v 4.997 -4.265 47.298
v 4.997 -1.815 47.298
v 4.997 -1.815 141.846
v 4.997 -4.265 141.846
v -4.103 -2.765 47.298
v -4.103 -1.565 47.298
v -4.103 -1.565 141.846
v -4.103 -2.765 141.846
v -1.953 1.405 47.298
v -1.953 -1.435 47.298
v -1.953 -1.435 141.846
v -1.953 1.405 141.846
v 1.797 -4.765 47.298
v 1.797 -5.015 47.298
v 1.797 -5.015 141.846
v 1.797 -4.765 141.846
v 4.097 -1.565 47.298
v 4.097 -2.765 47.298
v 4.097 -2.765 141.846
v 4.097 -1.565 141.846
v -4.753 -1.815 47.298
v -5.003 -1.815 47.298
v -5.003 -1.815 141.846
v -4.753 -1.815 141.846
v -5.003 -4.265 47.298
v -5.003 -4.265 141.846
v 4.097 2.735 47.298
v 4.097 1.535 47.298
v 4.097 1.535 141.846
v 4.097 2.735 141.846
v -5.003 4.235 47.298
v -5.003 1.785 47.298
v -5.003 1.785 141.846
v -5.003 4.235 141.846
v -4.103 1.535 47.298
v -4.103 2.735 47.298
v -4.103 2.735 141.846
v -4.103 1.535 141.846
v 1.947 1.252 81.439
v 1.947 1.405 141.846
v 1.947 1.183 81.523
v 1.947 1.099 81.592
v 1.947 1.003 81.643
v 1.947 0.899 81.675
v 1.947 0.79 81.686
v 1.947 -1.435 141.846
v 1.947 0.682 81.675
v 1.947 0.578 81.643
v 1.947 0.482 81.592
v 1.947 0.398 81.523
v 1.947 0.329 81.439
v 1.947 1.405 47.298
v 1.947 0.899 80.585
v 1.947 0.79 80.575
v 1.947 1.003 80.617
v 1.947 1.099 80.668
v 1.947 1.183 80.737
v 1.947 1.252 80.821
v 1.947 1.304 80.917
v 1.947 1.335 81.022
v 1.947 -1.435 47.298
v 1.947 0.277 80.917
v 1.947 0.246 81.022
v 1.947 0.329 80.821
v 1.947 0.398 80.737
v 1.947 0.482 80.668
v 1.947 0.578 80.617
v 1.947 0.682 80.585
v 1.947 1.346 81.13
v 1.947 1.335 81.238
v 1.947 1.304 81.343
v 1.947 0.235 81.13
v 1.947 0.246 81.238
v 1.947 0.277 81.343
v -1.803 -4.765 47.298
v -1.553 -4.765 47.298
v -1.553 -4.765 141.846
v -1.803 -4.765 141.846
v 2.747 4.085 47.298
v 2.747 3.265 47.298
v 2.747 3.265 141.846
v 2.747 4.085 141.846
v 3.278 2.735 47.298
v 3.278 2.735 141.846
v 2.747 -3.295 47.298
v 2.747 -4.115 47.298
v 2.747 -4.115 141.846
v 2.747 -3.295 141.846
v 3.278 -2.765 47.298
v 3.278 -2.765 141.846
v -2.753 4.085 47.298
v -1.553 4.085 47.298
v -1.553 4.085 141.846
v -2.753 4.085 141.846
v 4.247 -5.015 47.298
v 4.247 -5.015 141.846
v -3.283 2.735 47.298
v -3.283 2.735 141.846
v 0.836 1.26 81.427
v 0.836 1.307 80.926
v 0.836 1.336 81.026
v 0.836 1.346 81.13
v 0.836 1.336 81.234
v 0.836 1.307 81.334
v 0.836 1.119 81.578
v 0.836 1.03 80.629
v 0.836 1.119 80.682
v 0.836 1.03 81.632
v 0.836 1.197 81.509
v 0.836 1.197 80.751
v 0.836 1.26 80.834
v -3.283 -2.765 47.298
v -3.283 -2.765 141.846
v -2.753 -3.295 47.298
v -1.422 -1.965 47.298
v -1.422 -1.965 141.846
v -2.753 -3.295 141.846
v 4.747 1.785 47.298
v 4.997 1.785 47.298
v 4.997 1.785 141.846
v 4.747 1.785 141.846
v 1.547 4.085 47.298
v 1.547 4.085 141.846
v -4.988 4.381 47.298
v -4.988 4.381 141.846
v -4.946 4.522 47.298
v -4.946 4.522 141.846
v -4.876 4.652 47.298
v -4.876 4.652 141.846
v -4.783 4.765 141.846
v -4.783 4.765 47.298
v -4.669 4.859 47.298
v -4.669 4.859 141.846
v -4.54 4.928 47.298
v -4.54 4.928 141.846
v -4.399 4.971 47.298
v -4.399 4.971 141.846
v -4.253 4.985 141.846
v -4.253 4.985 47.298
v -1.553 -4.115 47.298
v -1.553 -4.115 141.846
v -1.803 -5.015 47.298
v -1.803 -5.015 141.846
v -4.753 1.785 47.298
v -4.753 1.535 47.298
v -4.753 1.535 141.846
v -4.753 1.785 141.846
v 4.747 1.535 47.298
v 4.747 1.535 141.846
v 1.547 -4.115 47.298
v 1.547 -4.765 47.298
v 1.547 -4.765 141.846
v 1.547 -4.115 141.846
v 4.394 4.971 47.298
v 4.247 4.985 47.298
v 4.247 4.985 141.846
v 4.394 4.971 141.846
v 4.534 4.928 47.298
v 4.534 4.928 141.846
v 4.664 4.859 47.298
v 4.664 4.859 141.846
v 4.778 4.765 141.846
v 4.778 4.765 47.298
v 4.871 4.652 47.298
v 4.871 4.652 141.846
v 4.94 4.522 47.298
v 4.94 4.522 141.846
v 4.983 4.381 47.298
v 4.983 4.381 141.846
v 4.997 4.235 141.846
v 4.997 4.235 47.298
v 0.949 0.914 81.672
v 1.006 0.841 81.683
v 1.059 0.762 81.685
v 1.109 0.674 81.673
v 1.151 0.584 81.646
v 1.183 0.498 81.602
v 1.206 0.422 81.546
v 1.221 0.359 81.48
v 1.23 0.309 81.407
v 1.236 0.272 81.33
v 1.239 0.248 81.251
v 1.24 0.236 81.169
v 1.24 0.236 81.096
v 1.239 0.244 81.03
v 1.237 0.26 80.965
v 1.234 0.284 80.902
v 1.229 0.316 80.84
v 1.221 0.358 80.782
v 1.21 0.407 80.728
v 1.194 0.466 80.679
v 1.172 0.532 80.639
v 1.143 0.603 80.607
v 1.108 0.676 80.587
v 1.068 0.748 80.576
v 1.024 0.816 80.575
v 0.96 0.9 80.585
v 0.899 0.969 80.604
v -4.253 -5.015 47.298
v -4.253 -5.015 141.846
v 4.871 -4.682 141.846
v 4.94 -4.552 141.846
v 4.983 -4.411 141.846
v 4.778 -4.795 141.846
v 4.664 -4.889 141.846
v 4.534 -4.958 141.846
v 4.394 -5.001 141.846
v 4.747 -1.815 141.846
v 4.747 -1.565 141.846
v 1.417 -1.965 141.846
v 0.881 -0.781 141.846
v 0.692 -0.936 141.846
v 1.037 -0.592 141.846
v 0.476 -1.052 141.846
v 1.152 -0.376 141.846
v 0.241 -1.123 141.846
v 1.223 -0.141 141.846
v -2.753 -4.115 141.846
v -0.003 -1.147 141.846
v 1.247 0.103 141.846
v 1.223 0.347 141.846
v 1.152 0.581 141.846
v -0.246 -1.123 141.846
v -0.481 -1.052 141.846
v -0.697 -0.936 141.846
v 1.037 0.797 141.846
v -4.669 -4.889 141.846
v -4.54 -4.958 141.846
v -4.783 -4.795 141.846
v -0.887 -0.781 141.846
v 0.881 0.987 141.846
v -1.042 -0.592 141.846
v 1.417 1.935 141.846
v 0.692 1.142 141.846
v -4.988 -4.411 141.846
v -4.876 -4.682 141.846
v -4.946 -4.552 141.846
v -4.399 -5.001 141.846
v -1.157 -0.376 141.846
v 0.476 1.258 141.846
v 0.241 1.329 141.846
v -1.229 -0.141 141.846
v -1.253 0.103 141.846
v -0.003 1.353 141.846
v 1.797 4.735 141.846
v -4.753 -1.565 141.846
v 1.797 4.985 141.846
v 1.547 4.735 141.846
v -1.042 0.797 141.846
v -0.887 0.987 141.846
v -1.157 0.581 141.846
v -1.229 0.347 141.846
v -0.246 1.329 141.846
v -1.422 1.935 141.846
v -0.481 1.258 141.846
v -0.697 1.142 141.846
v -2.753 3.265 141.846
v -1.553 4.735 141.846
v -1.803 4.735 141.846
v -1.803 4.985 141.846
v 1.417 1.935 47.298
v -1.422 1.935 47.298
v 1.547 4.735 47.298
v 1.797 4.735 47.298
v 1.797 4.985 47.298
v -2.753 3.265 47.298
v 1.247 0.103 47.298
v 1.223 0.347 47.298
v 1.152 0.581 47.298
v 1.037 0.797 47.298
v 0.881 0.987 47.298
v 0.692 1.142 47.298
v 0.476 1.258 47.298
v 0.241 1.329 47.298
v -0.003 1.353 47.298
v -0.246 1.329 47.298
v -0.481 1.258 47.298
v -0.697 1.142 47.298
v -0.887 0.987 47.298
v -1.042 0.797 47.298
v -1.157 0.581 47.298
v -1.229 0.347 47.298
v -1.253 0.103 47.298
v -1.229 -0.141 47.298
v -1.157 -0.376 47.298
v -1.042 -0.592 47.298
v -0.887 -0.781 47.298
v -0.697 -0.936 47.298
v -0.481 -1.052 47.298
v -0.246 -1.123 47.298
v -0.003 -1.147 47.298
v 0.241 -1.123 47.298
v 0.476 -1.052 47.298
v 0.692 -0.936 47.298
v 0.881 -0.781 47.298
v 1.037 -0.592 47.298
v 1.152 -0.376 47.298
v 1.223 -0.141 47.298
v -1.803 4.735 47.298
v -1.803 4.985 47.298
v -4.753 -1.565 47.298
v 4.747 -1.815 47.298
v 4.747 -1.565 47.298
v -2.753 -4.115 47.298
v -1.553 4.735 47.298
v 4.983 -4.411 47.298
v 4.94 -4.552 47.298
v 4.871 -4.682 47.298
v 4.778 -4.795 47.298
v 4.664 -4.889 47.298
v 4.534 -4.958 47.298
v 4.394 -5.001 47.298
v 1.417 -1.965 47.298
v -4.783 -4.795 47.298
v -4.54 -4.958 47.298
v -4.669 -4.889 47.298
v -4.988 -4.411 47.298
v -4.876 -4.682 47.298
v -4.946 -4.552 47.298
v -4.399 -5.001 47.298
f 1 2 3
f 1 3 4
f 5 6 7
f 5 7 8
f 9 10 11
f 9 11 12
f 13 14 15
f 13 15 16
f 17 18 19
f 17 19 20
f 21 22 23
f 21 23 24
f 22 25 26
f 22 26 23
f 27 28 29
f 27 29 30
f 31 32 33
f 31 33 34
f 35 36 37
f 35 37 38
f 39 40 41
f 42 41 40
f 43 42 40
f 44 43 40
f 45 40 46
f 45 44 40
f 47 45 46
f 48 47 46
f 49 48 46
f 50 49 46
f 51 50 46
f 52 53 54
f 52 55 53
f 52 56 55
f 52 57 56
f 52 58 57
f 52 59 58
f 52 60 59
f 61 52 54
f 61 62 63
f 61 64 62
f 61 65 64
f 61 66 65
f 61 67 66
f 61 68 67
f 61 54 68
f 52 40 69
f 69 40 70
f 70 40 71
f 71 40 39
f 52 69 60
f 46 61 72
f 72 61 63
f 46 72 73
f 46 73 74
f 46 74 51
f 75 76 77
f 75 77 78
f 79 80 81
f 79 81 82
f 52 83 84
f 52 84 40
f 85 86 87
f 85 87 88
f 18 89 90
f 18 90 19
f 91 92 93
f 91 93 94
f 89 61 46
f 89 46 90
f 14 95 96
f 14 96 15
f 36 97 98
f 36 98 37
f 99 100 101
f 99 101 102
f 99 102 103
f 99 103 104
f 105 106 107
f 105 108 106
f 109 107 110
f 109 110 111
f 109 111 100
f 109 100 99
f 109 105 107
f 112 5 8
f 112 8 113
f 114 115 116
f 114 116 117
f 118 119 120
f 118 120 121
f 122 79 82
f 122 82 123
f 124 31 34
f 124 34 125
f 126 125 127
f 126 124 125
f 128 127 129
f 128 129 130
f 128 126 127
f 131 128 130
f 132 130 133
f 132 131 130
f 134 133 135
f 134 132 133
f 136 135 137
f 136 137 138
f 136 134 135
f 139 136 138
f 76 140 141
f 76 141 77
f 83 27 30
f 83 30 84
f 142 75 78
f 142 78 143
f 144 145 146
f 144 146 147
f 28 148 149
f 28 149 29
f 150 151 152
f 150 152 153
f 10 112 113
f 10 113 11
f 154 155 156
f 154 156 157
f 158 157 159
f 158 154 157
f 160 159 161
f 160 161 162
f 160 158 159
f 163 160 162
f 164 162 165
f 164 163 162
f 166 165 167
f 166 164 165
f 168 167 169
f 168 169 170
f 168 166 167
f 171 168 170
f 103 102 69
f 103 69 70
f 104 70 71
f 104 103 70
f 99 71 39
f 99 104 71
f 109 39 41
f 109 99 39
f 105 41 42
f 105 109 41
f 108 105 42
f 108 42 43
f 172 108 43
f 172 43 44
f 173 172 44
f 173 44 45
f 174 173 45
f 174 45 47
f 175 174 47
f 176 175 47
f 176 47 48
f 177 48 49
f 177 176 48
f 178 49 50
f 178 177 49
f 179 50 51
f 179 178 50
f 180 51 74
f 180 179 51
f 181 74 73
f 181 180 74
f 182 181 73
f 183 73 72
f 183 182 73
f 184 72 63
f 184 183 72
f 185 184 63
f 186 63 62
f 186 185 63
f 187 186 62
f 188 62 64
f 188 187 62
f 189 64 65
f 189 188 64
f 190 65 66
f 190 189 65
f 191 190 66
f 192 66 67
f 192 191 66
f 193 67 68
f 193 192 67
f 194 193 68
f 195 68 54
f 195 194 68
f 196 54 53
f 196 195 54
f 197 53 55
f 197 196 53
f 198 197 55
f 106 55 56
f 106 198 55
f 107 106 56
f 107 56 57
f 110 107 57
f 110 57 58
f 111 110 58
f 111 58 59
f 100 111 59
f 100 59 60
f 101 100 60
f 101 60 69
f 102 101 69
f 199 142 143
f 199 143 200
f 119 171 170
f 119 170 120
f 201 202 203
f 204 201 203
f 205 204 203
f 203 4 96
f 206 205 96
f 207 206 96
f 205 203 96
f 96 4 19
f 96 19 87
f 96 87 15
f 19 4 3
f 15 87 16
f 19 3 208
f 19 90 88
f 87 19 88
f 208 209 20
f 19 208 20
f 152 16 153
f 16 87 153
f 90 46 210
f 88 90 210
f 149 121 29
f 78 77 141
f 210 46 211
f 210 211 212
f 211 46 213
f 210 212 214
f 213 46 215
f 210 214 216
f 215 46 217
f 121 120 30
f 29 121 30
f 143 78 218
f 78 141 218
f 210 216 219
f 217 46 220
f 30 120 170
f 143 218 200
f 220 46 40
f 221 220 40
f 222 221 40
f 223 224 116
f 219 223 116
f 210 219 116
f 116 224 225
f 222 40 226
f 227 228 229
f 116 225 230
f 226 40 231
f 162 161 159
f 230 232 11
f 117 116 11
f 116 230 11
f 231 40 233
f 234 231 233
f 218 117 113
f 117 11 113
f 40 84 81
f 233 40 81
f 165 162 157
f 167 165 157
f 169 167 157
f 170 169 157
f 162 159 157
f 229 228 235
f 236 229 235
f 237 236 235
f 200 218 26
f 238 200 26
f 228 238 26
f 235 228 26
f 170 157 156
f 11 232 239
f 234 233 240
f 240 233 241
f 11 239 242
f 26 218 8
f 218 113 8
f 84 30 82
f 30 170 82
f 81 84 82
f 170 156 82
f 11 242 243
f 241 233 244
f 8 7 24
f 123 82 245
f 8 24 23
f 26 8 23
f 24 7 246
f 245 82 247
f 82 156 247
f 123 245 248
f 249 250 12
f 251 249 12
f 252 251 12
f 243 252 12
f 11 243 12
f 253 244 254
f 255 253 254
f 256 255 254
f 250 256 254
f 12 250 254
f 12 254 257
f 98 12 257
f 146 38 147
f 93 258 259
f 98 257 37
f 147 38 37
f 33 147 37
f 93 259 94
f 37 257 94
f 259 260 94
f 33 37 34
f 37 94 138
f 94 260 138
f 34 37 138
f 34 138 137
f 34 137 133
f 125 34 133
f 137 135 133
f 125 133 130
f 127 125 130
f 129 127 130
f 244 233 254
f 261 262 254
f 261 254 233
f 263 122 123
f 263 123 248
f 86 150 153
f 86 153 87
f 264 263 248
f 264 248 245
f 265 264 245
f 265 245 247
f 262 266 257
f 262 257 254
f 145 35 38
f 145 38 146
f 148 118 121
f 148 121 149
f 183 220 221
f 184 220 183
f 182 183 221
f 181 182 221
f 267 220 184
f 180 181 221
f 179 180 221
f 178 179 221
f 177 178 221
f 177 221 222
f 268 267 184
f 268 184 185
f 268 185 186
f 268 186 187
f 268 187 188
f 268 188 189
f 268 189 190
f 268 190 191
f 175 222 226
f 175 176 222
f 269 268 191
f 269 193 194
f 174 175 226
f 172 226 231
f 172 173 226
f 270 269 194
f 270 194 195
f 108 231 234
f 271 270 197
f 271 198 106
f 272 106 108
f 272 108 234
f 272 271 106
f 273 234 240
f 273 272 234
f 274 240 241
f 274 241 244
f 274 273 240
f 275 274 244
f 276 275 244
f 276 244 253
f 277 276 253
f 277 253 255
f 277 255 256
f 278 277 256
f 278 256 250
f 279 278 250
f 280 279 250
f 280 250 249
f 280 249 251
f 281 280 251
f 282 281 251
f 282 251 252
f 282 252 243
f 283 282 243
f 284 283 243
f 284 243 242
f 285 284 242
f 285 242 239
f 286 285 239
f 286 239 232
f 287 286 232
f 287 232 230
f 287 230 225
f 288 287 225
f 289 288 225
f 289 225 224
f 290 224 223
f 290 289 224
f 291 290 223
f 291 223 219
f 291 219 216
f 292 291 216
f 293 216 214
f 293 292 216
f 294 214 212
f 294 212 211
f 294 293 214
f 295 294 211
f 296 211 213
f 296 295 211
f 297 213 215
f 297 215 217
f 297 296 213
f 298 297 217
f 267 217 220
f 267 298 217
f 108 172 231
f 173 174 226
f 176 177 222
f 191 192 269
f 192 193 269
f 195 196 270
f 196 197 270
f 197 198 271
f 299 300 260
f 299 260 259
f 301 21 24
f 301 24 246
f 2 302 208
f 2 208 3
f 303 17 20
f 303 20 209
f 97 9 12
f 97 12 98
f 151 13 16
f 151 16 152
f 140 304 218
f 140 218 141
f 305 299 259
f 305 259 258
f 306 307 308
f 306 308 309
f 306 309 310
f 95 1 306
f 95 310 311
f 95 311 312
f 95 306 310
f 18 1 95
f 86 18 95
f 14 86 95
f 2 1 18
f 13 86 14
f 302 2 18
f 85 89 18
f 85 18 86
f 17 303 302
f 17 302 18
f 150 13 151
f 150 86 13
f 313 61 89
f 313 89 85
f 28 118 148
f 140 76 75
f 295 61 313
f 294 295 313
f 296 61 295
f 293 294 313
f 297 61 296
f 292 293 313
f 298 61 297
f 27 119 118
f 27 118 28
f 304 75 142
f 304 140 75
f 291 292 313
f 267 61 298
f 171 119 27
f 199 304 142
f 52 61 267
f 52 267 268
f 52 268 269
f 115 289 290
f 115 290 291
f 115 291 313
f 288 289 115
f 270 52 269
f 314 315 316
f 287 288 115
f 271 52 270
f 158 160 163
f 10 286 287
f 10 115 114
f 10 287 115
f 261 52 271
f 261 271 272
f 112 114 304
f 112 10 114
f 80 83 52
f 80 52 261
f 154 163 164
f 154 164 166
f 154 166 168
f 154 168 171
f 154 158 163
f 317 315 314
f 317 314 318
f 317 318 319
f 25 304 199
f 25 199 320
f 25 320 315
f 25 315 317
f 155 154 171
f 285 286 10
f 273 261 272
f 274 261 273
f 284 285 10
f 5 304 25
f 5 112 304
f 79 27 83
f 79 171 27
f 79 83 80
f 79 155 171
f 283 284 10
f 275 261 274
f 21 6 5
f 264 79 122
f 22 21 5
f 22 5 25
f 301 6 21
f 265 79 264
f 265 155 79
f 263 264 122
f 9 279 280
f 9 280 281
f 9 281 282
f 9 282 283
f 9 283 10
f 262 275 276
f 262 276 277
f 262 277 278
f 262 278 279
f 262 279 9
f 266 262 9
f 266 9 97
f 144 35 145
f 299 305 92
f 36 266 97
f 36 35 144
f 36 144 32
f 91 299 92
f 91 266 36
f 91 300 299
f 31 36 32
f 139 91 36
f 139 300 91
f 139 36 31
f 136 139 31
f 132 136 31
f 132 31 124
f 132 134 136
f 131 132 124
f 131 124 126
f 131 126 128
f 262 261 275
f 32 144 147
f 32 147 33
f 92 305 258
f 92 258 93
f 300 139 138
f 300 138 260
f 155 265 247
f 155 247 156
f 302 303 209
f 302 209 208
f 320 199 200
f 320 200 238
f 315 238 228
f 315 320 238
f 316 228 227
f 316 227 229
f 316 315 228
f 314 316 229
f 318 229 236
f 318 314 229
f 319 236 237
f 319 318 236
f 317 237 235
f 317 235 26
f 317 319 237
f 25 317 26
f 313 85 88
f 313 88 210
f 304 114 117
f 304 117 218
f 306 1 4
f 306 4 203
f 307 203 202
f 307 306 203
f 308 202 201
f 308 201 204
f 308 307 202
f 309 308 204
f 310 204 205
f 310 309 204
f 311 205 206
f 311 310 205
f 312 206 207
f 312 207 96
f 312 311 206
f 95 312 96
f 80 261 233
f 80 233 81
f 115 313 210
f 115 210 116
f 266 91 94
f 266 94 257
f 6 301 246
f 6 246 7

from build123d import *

# Parameters (mm, degrees)
SKETCH1_R           = 2.5
BOSS_EXTRUDE1_DEPTH = 189.096108091
SCALE_2_SCALE       = 3
SCALE_3_SCALE       = 6
SCALE_5_SCALE       = 2
SCALE_6_SCALE       = 0.25
SCALE_7_SCALE       = 0.125
SCALE_8_SCALE       = 0.25
SCALE_9_SCALE       = 4
SCALE_10_SCALE      = 4
OTHER_START         = 7.55
OTHER_1_OUTLINE_R   = 5
OTHER_1_DEPTH       = 10
SCALE_11_SCALE      = 0.111111111


# Read off the part's stored shape, not the designer's step: 孔1
with BuildPart() as part:
    # Sketch1 → Boss-Extrude1 (new body)
    with BuildSketch(Plane.XY):
        with BuildLine():
            Line((2.839339828, 3.9), (5.5, 6.560660172))
            Line((5.5, 6.560660172), (5.5, 8.2))
            Line((5.5, 8.2), (3.1, 8.2))
            Line((3.1, 8.2), (3.1, 9.5))
            Line((3.1, 9.5), (3.6, 9.5))
            Line((3.6, 9.5), (3.6, 10))
            Line((3.6, 10), (8.5, 10))
            ThreePointArc((8.5, 10), (9.560660172, 9.560660172), (10, 8.5))
            Line((10, 8.5), (10, 3.6))
            Line((10, 3.6), (9.5, 3.6))
            Line((9.5, 3.6), (9.5, 3.1))
            Line((9.5, 3.1), (8.2, 3.1))
            Line((8.2, 3.1), (8.2, 5.5))
            Line((8.2, 5.5), (6.560660172, 5.5))
            Line((6.560660172, 5.5), (3.9, 2.839339828))
            Line((3.9, 2.839339828), (3.9, -2.839339828))
            Line((3.9, -2.839339828), (6.560660172, -5.5))
            Line((6.560660172, -5.5), (8.2, -5.5))
            Line((8.2, -5.5), (8.2, -3.1))
            Line((8.2, -3.1), (9.5, -3.1))
            Line((9.5, -3.1), (9.5, -3.6))
            Line((9.5, -3.6), (10, -3.6))
            Line((10, -3.6), (10, -8.5))
            ThreePointArc((10, -8.5), (9.560660172, -9.560660172), (8.5, -10))
            Line((8.5, -10), (3.6, -10))
            Line((3.6, -10), (3.6, -9.5))
            Line((3.6, -9.5), (3.1, -9.5))
            Line((3.1, -9.5), (3.1, -8.2))
            Line((3.1, -8.2), (5.5, -8.2))
            Line((5.5, -8.2), (5.5, -6.560660172))
            Line((5.5, -6.560660172), (2.839339828, -3.9))
            Line((2.839339828, -3.9), (-2.839339828, -3.9))
            Line((-2.839339828, -3.9), (-5.5, -6.560660172))
            Line((-5.5, -6.560660172), (-5.5, -8.2))
            Line((-5.5, -8.2), (-3.1, -8.2))
            Line((-3.1, -8.2), (-3.1, -9.5))
            Line((-3.1, -9.5), (-3.6, -9.5))
            Line((-3.6, -9.5), (-3.6, -10))
            Line((-3.6, -10), (-8.5, -10))
            ThreePointArc((-8.5, -10), (-9.560660172, -9.560660172), (-10, -8.5))
            Line((-10, -8.5), (-10, -3.6))
            Line((-10, -3.6), (-9.5, -3.6))
            Line((-9.5, -3.6), (-9.5, -3.1))
            Line((-9.5, -3.1), (-8.2, -3.1))
            Line((-8.2, -3.1), (-8.2, -5.5))
            Line((-8.2, -5.5), (-6.560660172, -5.5))
            Line((-6.560660172, -5.5), (-3.9, -2.839339828))
            Line((-3.9, -2.839339828), (-3.9, 2.839339828))
            Line((-3.9, 2.839339828), (-6.560660172, 5.5))
            Line((-6.560660172, 5.5), (-8.2, 5.5))
            Line((-8.2, 5.5), (-8.2, 3.1))
            Line((-8.2, 3.1), (-9.5, 3.1))
            Line((-9.5, 3.1), (-9.5, 3.6))
            Line((-9.5, 3.6), (-10, 3.6))
            Line((-10, 3.6), (-10, 8.5))
            ThreePointArc((-10, 8.5), (-9.560660172, 9.560660172), (-8.5, 10))
            Line((-8.5, 10), (-3.6, 10))
            Line((-3.6, 10), (-3.6, 9.5))
            Line((-3.6, 9.5), (-3.1, 9.5))
            Line((-3.1, 9.5), (-3.1, 8.2))
            Line((-3.1, 8.2), (-5.5, 8.2))
            Line((-5.5, 8.2), (-5.5, 6.560660172))
            Line((-5.5, 6.560660172), (-2.839339828, 3.9))
            Line((-2.839339828, 3.9), (2.839339828, 3.9))
        make_face()
        with Locations((0, 0.235847297)):
            Circle(SKETCH1_R, mode=Mode.SUBTRACT)
    extrude(amount=BOSS_EXTRUDE1_DEPTH)


with BuildPart() as part_1:
    # 缩放比例2: scaled about (0, -0.027095247, 94.548054046)
    add(part.part.scale(SCALE_2_SCALE).moved(Location((0, 0.054190494, -189.096108092))))


with BuildPart() as part_2:
    # 缩放比例3: scaled about (0, -0.027095247, 94.548054045)
    add(part_1.part.scale(SCALE_3_SCALE).moved(Location((0, 0.135476235, -472.740270225))))


with BuildPart() as part_3:
    # 缩放比例5: scaled about (0, -0.027095249, 94.548054043)
    add(part_2.part.scale(SCALE_5_SCALE).moved(Location((0, 0.027095249, -94.548054043))))


with BuildPart() as part_4:
    # 缩放比例6: scaled about (0, -0.027095249, 94.548054044)
    add(part_3.part.scale(SCALE_6_SCALE).moved(Location((0, -0.020321437, 70.911040533))))


with BuildPart() as part_5:
    # 缩放比例7: scaled about (0, -0.027095249, 94.548054044)
    add(part_4.part.scale(SCALE_7_SCALE).moved(Location((0, -0.023708343, 82.729547289))))


with BuildPart() as part_6:
    # 缩放比例8: scaled about (0, -0.027095249, 94.548054044)
    add(part_5.part.scale(SCALE_8_SCALE).moved(Location((0, -0.020321437, 70.911040533))))


with BuildPart() as part_7:
    # 缩放比例9: scaled about (0, -0.027095249, 94.548054044)
    add(part_6.part.scale(SCALE_9_SCALE).moved(Location((0, 0.081285747, -283.644162132))))


with BuildPart() as part_8:
    # 缩放比例10: scaled about (0, -0.027095249, 94.548054044)
    add(part_7.part.scale(SCALE_10_SCALE).moved(Location((0, 0.081285747, -283.644162132))))

    # 孔1 outline → 孔1 (cut)
    with BuildSketch(Plane.YZ.offset(OTHER_START)):
        with Locations((7.344832291, -26.42806198)):
            Circle(OTHER_1_OUTLINE_R)
    extrude(amount=OTHER_1_DEPTH, mode=Mode.SUBTRACT)


with BuildPart() as part_9:
    # 缩放比例11: scaled about (-0.002946752, -0.028813034, 94.574865823)
    add(part_8.part.scale(SCALE_11_SCALE).moved(Location((-0.002619335, -0.025611586, 84.066547398))))


solid = part_9.part
